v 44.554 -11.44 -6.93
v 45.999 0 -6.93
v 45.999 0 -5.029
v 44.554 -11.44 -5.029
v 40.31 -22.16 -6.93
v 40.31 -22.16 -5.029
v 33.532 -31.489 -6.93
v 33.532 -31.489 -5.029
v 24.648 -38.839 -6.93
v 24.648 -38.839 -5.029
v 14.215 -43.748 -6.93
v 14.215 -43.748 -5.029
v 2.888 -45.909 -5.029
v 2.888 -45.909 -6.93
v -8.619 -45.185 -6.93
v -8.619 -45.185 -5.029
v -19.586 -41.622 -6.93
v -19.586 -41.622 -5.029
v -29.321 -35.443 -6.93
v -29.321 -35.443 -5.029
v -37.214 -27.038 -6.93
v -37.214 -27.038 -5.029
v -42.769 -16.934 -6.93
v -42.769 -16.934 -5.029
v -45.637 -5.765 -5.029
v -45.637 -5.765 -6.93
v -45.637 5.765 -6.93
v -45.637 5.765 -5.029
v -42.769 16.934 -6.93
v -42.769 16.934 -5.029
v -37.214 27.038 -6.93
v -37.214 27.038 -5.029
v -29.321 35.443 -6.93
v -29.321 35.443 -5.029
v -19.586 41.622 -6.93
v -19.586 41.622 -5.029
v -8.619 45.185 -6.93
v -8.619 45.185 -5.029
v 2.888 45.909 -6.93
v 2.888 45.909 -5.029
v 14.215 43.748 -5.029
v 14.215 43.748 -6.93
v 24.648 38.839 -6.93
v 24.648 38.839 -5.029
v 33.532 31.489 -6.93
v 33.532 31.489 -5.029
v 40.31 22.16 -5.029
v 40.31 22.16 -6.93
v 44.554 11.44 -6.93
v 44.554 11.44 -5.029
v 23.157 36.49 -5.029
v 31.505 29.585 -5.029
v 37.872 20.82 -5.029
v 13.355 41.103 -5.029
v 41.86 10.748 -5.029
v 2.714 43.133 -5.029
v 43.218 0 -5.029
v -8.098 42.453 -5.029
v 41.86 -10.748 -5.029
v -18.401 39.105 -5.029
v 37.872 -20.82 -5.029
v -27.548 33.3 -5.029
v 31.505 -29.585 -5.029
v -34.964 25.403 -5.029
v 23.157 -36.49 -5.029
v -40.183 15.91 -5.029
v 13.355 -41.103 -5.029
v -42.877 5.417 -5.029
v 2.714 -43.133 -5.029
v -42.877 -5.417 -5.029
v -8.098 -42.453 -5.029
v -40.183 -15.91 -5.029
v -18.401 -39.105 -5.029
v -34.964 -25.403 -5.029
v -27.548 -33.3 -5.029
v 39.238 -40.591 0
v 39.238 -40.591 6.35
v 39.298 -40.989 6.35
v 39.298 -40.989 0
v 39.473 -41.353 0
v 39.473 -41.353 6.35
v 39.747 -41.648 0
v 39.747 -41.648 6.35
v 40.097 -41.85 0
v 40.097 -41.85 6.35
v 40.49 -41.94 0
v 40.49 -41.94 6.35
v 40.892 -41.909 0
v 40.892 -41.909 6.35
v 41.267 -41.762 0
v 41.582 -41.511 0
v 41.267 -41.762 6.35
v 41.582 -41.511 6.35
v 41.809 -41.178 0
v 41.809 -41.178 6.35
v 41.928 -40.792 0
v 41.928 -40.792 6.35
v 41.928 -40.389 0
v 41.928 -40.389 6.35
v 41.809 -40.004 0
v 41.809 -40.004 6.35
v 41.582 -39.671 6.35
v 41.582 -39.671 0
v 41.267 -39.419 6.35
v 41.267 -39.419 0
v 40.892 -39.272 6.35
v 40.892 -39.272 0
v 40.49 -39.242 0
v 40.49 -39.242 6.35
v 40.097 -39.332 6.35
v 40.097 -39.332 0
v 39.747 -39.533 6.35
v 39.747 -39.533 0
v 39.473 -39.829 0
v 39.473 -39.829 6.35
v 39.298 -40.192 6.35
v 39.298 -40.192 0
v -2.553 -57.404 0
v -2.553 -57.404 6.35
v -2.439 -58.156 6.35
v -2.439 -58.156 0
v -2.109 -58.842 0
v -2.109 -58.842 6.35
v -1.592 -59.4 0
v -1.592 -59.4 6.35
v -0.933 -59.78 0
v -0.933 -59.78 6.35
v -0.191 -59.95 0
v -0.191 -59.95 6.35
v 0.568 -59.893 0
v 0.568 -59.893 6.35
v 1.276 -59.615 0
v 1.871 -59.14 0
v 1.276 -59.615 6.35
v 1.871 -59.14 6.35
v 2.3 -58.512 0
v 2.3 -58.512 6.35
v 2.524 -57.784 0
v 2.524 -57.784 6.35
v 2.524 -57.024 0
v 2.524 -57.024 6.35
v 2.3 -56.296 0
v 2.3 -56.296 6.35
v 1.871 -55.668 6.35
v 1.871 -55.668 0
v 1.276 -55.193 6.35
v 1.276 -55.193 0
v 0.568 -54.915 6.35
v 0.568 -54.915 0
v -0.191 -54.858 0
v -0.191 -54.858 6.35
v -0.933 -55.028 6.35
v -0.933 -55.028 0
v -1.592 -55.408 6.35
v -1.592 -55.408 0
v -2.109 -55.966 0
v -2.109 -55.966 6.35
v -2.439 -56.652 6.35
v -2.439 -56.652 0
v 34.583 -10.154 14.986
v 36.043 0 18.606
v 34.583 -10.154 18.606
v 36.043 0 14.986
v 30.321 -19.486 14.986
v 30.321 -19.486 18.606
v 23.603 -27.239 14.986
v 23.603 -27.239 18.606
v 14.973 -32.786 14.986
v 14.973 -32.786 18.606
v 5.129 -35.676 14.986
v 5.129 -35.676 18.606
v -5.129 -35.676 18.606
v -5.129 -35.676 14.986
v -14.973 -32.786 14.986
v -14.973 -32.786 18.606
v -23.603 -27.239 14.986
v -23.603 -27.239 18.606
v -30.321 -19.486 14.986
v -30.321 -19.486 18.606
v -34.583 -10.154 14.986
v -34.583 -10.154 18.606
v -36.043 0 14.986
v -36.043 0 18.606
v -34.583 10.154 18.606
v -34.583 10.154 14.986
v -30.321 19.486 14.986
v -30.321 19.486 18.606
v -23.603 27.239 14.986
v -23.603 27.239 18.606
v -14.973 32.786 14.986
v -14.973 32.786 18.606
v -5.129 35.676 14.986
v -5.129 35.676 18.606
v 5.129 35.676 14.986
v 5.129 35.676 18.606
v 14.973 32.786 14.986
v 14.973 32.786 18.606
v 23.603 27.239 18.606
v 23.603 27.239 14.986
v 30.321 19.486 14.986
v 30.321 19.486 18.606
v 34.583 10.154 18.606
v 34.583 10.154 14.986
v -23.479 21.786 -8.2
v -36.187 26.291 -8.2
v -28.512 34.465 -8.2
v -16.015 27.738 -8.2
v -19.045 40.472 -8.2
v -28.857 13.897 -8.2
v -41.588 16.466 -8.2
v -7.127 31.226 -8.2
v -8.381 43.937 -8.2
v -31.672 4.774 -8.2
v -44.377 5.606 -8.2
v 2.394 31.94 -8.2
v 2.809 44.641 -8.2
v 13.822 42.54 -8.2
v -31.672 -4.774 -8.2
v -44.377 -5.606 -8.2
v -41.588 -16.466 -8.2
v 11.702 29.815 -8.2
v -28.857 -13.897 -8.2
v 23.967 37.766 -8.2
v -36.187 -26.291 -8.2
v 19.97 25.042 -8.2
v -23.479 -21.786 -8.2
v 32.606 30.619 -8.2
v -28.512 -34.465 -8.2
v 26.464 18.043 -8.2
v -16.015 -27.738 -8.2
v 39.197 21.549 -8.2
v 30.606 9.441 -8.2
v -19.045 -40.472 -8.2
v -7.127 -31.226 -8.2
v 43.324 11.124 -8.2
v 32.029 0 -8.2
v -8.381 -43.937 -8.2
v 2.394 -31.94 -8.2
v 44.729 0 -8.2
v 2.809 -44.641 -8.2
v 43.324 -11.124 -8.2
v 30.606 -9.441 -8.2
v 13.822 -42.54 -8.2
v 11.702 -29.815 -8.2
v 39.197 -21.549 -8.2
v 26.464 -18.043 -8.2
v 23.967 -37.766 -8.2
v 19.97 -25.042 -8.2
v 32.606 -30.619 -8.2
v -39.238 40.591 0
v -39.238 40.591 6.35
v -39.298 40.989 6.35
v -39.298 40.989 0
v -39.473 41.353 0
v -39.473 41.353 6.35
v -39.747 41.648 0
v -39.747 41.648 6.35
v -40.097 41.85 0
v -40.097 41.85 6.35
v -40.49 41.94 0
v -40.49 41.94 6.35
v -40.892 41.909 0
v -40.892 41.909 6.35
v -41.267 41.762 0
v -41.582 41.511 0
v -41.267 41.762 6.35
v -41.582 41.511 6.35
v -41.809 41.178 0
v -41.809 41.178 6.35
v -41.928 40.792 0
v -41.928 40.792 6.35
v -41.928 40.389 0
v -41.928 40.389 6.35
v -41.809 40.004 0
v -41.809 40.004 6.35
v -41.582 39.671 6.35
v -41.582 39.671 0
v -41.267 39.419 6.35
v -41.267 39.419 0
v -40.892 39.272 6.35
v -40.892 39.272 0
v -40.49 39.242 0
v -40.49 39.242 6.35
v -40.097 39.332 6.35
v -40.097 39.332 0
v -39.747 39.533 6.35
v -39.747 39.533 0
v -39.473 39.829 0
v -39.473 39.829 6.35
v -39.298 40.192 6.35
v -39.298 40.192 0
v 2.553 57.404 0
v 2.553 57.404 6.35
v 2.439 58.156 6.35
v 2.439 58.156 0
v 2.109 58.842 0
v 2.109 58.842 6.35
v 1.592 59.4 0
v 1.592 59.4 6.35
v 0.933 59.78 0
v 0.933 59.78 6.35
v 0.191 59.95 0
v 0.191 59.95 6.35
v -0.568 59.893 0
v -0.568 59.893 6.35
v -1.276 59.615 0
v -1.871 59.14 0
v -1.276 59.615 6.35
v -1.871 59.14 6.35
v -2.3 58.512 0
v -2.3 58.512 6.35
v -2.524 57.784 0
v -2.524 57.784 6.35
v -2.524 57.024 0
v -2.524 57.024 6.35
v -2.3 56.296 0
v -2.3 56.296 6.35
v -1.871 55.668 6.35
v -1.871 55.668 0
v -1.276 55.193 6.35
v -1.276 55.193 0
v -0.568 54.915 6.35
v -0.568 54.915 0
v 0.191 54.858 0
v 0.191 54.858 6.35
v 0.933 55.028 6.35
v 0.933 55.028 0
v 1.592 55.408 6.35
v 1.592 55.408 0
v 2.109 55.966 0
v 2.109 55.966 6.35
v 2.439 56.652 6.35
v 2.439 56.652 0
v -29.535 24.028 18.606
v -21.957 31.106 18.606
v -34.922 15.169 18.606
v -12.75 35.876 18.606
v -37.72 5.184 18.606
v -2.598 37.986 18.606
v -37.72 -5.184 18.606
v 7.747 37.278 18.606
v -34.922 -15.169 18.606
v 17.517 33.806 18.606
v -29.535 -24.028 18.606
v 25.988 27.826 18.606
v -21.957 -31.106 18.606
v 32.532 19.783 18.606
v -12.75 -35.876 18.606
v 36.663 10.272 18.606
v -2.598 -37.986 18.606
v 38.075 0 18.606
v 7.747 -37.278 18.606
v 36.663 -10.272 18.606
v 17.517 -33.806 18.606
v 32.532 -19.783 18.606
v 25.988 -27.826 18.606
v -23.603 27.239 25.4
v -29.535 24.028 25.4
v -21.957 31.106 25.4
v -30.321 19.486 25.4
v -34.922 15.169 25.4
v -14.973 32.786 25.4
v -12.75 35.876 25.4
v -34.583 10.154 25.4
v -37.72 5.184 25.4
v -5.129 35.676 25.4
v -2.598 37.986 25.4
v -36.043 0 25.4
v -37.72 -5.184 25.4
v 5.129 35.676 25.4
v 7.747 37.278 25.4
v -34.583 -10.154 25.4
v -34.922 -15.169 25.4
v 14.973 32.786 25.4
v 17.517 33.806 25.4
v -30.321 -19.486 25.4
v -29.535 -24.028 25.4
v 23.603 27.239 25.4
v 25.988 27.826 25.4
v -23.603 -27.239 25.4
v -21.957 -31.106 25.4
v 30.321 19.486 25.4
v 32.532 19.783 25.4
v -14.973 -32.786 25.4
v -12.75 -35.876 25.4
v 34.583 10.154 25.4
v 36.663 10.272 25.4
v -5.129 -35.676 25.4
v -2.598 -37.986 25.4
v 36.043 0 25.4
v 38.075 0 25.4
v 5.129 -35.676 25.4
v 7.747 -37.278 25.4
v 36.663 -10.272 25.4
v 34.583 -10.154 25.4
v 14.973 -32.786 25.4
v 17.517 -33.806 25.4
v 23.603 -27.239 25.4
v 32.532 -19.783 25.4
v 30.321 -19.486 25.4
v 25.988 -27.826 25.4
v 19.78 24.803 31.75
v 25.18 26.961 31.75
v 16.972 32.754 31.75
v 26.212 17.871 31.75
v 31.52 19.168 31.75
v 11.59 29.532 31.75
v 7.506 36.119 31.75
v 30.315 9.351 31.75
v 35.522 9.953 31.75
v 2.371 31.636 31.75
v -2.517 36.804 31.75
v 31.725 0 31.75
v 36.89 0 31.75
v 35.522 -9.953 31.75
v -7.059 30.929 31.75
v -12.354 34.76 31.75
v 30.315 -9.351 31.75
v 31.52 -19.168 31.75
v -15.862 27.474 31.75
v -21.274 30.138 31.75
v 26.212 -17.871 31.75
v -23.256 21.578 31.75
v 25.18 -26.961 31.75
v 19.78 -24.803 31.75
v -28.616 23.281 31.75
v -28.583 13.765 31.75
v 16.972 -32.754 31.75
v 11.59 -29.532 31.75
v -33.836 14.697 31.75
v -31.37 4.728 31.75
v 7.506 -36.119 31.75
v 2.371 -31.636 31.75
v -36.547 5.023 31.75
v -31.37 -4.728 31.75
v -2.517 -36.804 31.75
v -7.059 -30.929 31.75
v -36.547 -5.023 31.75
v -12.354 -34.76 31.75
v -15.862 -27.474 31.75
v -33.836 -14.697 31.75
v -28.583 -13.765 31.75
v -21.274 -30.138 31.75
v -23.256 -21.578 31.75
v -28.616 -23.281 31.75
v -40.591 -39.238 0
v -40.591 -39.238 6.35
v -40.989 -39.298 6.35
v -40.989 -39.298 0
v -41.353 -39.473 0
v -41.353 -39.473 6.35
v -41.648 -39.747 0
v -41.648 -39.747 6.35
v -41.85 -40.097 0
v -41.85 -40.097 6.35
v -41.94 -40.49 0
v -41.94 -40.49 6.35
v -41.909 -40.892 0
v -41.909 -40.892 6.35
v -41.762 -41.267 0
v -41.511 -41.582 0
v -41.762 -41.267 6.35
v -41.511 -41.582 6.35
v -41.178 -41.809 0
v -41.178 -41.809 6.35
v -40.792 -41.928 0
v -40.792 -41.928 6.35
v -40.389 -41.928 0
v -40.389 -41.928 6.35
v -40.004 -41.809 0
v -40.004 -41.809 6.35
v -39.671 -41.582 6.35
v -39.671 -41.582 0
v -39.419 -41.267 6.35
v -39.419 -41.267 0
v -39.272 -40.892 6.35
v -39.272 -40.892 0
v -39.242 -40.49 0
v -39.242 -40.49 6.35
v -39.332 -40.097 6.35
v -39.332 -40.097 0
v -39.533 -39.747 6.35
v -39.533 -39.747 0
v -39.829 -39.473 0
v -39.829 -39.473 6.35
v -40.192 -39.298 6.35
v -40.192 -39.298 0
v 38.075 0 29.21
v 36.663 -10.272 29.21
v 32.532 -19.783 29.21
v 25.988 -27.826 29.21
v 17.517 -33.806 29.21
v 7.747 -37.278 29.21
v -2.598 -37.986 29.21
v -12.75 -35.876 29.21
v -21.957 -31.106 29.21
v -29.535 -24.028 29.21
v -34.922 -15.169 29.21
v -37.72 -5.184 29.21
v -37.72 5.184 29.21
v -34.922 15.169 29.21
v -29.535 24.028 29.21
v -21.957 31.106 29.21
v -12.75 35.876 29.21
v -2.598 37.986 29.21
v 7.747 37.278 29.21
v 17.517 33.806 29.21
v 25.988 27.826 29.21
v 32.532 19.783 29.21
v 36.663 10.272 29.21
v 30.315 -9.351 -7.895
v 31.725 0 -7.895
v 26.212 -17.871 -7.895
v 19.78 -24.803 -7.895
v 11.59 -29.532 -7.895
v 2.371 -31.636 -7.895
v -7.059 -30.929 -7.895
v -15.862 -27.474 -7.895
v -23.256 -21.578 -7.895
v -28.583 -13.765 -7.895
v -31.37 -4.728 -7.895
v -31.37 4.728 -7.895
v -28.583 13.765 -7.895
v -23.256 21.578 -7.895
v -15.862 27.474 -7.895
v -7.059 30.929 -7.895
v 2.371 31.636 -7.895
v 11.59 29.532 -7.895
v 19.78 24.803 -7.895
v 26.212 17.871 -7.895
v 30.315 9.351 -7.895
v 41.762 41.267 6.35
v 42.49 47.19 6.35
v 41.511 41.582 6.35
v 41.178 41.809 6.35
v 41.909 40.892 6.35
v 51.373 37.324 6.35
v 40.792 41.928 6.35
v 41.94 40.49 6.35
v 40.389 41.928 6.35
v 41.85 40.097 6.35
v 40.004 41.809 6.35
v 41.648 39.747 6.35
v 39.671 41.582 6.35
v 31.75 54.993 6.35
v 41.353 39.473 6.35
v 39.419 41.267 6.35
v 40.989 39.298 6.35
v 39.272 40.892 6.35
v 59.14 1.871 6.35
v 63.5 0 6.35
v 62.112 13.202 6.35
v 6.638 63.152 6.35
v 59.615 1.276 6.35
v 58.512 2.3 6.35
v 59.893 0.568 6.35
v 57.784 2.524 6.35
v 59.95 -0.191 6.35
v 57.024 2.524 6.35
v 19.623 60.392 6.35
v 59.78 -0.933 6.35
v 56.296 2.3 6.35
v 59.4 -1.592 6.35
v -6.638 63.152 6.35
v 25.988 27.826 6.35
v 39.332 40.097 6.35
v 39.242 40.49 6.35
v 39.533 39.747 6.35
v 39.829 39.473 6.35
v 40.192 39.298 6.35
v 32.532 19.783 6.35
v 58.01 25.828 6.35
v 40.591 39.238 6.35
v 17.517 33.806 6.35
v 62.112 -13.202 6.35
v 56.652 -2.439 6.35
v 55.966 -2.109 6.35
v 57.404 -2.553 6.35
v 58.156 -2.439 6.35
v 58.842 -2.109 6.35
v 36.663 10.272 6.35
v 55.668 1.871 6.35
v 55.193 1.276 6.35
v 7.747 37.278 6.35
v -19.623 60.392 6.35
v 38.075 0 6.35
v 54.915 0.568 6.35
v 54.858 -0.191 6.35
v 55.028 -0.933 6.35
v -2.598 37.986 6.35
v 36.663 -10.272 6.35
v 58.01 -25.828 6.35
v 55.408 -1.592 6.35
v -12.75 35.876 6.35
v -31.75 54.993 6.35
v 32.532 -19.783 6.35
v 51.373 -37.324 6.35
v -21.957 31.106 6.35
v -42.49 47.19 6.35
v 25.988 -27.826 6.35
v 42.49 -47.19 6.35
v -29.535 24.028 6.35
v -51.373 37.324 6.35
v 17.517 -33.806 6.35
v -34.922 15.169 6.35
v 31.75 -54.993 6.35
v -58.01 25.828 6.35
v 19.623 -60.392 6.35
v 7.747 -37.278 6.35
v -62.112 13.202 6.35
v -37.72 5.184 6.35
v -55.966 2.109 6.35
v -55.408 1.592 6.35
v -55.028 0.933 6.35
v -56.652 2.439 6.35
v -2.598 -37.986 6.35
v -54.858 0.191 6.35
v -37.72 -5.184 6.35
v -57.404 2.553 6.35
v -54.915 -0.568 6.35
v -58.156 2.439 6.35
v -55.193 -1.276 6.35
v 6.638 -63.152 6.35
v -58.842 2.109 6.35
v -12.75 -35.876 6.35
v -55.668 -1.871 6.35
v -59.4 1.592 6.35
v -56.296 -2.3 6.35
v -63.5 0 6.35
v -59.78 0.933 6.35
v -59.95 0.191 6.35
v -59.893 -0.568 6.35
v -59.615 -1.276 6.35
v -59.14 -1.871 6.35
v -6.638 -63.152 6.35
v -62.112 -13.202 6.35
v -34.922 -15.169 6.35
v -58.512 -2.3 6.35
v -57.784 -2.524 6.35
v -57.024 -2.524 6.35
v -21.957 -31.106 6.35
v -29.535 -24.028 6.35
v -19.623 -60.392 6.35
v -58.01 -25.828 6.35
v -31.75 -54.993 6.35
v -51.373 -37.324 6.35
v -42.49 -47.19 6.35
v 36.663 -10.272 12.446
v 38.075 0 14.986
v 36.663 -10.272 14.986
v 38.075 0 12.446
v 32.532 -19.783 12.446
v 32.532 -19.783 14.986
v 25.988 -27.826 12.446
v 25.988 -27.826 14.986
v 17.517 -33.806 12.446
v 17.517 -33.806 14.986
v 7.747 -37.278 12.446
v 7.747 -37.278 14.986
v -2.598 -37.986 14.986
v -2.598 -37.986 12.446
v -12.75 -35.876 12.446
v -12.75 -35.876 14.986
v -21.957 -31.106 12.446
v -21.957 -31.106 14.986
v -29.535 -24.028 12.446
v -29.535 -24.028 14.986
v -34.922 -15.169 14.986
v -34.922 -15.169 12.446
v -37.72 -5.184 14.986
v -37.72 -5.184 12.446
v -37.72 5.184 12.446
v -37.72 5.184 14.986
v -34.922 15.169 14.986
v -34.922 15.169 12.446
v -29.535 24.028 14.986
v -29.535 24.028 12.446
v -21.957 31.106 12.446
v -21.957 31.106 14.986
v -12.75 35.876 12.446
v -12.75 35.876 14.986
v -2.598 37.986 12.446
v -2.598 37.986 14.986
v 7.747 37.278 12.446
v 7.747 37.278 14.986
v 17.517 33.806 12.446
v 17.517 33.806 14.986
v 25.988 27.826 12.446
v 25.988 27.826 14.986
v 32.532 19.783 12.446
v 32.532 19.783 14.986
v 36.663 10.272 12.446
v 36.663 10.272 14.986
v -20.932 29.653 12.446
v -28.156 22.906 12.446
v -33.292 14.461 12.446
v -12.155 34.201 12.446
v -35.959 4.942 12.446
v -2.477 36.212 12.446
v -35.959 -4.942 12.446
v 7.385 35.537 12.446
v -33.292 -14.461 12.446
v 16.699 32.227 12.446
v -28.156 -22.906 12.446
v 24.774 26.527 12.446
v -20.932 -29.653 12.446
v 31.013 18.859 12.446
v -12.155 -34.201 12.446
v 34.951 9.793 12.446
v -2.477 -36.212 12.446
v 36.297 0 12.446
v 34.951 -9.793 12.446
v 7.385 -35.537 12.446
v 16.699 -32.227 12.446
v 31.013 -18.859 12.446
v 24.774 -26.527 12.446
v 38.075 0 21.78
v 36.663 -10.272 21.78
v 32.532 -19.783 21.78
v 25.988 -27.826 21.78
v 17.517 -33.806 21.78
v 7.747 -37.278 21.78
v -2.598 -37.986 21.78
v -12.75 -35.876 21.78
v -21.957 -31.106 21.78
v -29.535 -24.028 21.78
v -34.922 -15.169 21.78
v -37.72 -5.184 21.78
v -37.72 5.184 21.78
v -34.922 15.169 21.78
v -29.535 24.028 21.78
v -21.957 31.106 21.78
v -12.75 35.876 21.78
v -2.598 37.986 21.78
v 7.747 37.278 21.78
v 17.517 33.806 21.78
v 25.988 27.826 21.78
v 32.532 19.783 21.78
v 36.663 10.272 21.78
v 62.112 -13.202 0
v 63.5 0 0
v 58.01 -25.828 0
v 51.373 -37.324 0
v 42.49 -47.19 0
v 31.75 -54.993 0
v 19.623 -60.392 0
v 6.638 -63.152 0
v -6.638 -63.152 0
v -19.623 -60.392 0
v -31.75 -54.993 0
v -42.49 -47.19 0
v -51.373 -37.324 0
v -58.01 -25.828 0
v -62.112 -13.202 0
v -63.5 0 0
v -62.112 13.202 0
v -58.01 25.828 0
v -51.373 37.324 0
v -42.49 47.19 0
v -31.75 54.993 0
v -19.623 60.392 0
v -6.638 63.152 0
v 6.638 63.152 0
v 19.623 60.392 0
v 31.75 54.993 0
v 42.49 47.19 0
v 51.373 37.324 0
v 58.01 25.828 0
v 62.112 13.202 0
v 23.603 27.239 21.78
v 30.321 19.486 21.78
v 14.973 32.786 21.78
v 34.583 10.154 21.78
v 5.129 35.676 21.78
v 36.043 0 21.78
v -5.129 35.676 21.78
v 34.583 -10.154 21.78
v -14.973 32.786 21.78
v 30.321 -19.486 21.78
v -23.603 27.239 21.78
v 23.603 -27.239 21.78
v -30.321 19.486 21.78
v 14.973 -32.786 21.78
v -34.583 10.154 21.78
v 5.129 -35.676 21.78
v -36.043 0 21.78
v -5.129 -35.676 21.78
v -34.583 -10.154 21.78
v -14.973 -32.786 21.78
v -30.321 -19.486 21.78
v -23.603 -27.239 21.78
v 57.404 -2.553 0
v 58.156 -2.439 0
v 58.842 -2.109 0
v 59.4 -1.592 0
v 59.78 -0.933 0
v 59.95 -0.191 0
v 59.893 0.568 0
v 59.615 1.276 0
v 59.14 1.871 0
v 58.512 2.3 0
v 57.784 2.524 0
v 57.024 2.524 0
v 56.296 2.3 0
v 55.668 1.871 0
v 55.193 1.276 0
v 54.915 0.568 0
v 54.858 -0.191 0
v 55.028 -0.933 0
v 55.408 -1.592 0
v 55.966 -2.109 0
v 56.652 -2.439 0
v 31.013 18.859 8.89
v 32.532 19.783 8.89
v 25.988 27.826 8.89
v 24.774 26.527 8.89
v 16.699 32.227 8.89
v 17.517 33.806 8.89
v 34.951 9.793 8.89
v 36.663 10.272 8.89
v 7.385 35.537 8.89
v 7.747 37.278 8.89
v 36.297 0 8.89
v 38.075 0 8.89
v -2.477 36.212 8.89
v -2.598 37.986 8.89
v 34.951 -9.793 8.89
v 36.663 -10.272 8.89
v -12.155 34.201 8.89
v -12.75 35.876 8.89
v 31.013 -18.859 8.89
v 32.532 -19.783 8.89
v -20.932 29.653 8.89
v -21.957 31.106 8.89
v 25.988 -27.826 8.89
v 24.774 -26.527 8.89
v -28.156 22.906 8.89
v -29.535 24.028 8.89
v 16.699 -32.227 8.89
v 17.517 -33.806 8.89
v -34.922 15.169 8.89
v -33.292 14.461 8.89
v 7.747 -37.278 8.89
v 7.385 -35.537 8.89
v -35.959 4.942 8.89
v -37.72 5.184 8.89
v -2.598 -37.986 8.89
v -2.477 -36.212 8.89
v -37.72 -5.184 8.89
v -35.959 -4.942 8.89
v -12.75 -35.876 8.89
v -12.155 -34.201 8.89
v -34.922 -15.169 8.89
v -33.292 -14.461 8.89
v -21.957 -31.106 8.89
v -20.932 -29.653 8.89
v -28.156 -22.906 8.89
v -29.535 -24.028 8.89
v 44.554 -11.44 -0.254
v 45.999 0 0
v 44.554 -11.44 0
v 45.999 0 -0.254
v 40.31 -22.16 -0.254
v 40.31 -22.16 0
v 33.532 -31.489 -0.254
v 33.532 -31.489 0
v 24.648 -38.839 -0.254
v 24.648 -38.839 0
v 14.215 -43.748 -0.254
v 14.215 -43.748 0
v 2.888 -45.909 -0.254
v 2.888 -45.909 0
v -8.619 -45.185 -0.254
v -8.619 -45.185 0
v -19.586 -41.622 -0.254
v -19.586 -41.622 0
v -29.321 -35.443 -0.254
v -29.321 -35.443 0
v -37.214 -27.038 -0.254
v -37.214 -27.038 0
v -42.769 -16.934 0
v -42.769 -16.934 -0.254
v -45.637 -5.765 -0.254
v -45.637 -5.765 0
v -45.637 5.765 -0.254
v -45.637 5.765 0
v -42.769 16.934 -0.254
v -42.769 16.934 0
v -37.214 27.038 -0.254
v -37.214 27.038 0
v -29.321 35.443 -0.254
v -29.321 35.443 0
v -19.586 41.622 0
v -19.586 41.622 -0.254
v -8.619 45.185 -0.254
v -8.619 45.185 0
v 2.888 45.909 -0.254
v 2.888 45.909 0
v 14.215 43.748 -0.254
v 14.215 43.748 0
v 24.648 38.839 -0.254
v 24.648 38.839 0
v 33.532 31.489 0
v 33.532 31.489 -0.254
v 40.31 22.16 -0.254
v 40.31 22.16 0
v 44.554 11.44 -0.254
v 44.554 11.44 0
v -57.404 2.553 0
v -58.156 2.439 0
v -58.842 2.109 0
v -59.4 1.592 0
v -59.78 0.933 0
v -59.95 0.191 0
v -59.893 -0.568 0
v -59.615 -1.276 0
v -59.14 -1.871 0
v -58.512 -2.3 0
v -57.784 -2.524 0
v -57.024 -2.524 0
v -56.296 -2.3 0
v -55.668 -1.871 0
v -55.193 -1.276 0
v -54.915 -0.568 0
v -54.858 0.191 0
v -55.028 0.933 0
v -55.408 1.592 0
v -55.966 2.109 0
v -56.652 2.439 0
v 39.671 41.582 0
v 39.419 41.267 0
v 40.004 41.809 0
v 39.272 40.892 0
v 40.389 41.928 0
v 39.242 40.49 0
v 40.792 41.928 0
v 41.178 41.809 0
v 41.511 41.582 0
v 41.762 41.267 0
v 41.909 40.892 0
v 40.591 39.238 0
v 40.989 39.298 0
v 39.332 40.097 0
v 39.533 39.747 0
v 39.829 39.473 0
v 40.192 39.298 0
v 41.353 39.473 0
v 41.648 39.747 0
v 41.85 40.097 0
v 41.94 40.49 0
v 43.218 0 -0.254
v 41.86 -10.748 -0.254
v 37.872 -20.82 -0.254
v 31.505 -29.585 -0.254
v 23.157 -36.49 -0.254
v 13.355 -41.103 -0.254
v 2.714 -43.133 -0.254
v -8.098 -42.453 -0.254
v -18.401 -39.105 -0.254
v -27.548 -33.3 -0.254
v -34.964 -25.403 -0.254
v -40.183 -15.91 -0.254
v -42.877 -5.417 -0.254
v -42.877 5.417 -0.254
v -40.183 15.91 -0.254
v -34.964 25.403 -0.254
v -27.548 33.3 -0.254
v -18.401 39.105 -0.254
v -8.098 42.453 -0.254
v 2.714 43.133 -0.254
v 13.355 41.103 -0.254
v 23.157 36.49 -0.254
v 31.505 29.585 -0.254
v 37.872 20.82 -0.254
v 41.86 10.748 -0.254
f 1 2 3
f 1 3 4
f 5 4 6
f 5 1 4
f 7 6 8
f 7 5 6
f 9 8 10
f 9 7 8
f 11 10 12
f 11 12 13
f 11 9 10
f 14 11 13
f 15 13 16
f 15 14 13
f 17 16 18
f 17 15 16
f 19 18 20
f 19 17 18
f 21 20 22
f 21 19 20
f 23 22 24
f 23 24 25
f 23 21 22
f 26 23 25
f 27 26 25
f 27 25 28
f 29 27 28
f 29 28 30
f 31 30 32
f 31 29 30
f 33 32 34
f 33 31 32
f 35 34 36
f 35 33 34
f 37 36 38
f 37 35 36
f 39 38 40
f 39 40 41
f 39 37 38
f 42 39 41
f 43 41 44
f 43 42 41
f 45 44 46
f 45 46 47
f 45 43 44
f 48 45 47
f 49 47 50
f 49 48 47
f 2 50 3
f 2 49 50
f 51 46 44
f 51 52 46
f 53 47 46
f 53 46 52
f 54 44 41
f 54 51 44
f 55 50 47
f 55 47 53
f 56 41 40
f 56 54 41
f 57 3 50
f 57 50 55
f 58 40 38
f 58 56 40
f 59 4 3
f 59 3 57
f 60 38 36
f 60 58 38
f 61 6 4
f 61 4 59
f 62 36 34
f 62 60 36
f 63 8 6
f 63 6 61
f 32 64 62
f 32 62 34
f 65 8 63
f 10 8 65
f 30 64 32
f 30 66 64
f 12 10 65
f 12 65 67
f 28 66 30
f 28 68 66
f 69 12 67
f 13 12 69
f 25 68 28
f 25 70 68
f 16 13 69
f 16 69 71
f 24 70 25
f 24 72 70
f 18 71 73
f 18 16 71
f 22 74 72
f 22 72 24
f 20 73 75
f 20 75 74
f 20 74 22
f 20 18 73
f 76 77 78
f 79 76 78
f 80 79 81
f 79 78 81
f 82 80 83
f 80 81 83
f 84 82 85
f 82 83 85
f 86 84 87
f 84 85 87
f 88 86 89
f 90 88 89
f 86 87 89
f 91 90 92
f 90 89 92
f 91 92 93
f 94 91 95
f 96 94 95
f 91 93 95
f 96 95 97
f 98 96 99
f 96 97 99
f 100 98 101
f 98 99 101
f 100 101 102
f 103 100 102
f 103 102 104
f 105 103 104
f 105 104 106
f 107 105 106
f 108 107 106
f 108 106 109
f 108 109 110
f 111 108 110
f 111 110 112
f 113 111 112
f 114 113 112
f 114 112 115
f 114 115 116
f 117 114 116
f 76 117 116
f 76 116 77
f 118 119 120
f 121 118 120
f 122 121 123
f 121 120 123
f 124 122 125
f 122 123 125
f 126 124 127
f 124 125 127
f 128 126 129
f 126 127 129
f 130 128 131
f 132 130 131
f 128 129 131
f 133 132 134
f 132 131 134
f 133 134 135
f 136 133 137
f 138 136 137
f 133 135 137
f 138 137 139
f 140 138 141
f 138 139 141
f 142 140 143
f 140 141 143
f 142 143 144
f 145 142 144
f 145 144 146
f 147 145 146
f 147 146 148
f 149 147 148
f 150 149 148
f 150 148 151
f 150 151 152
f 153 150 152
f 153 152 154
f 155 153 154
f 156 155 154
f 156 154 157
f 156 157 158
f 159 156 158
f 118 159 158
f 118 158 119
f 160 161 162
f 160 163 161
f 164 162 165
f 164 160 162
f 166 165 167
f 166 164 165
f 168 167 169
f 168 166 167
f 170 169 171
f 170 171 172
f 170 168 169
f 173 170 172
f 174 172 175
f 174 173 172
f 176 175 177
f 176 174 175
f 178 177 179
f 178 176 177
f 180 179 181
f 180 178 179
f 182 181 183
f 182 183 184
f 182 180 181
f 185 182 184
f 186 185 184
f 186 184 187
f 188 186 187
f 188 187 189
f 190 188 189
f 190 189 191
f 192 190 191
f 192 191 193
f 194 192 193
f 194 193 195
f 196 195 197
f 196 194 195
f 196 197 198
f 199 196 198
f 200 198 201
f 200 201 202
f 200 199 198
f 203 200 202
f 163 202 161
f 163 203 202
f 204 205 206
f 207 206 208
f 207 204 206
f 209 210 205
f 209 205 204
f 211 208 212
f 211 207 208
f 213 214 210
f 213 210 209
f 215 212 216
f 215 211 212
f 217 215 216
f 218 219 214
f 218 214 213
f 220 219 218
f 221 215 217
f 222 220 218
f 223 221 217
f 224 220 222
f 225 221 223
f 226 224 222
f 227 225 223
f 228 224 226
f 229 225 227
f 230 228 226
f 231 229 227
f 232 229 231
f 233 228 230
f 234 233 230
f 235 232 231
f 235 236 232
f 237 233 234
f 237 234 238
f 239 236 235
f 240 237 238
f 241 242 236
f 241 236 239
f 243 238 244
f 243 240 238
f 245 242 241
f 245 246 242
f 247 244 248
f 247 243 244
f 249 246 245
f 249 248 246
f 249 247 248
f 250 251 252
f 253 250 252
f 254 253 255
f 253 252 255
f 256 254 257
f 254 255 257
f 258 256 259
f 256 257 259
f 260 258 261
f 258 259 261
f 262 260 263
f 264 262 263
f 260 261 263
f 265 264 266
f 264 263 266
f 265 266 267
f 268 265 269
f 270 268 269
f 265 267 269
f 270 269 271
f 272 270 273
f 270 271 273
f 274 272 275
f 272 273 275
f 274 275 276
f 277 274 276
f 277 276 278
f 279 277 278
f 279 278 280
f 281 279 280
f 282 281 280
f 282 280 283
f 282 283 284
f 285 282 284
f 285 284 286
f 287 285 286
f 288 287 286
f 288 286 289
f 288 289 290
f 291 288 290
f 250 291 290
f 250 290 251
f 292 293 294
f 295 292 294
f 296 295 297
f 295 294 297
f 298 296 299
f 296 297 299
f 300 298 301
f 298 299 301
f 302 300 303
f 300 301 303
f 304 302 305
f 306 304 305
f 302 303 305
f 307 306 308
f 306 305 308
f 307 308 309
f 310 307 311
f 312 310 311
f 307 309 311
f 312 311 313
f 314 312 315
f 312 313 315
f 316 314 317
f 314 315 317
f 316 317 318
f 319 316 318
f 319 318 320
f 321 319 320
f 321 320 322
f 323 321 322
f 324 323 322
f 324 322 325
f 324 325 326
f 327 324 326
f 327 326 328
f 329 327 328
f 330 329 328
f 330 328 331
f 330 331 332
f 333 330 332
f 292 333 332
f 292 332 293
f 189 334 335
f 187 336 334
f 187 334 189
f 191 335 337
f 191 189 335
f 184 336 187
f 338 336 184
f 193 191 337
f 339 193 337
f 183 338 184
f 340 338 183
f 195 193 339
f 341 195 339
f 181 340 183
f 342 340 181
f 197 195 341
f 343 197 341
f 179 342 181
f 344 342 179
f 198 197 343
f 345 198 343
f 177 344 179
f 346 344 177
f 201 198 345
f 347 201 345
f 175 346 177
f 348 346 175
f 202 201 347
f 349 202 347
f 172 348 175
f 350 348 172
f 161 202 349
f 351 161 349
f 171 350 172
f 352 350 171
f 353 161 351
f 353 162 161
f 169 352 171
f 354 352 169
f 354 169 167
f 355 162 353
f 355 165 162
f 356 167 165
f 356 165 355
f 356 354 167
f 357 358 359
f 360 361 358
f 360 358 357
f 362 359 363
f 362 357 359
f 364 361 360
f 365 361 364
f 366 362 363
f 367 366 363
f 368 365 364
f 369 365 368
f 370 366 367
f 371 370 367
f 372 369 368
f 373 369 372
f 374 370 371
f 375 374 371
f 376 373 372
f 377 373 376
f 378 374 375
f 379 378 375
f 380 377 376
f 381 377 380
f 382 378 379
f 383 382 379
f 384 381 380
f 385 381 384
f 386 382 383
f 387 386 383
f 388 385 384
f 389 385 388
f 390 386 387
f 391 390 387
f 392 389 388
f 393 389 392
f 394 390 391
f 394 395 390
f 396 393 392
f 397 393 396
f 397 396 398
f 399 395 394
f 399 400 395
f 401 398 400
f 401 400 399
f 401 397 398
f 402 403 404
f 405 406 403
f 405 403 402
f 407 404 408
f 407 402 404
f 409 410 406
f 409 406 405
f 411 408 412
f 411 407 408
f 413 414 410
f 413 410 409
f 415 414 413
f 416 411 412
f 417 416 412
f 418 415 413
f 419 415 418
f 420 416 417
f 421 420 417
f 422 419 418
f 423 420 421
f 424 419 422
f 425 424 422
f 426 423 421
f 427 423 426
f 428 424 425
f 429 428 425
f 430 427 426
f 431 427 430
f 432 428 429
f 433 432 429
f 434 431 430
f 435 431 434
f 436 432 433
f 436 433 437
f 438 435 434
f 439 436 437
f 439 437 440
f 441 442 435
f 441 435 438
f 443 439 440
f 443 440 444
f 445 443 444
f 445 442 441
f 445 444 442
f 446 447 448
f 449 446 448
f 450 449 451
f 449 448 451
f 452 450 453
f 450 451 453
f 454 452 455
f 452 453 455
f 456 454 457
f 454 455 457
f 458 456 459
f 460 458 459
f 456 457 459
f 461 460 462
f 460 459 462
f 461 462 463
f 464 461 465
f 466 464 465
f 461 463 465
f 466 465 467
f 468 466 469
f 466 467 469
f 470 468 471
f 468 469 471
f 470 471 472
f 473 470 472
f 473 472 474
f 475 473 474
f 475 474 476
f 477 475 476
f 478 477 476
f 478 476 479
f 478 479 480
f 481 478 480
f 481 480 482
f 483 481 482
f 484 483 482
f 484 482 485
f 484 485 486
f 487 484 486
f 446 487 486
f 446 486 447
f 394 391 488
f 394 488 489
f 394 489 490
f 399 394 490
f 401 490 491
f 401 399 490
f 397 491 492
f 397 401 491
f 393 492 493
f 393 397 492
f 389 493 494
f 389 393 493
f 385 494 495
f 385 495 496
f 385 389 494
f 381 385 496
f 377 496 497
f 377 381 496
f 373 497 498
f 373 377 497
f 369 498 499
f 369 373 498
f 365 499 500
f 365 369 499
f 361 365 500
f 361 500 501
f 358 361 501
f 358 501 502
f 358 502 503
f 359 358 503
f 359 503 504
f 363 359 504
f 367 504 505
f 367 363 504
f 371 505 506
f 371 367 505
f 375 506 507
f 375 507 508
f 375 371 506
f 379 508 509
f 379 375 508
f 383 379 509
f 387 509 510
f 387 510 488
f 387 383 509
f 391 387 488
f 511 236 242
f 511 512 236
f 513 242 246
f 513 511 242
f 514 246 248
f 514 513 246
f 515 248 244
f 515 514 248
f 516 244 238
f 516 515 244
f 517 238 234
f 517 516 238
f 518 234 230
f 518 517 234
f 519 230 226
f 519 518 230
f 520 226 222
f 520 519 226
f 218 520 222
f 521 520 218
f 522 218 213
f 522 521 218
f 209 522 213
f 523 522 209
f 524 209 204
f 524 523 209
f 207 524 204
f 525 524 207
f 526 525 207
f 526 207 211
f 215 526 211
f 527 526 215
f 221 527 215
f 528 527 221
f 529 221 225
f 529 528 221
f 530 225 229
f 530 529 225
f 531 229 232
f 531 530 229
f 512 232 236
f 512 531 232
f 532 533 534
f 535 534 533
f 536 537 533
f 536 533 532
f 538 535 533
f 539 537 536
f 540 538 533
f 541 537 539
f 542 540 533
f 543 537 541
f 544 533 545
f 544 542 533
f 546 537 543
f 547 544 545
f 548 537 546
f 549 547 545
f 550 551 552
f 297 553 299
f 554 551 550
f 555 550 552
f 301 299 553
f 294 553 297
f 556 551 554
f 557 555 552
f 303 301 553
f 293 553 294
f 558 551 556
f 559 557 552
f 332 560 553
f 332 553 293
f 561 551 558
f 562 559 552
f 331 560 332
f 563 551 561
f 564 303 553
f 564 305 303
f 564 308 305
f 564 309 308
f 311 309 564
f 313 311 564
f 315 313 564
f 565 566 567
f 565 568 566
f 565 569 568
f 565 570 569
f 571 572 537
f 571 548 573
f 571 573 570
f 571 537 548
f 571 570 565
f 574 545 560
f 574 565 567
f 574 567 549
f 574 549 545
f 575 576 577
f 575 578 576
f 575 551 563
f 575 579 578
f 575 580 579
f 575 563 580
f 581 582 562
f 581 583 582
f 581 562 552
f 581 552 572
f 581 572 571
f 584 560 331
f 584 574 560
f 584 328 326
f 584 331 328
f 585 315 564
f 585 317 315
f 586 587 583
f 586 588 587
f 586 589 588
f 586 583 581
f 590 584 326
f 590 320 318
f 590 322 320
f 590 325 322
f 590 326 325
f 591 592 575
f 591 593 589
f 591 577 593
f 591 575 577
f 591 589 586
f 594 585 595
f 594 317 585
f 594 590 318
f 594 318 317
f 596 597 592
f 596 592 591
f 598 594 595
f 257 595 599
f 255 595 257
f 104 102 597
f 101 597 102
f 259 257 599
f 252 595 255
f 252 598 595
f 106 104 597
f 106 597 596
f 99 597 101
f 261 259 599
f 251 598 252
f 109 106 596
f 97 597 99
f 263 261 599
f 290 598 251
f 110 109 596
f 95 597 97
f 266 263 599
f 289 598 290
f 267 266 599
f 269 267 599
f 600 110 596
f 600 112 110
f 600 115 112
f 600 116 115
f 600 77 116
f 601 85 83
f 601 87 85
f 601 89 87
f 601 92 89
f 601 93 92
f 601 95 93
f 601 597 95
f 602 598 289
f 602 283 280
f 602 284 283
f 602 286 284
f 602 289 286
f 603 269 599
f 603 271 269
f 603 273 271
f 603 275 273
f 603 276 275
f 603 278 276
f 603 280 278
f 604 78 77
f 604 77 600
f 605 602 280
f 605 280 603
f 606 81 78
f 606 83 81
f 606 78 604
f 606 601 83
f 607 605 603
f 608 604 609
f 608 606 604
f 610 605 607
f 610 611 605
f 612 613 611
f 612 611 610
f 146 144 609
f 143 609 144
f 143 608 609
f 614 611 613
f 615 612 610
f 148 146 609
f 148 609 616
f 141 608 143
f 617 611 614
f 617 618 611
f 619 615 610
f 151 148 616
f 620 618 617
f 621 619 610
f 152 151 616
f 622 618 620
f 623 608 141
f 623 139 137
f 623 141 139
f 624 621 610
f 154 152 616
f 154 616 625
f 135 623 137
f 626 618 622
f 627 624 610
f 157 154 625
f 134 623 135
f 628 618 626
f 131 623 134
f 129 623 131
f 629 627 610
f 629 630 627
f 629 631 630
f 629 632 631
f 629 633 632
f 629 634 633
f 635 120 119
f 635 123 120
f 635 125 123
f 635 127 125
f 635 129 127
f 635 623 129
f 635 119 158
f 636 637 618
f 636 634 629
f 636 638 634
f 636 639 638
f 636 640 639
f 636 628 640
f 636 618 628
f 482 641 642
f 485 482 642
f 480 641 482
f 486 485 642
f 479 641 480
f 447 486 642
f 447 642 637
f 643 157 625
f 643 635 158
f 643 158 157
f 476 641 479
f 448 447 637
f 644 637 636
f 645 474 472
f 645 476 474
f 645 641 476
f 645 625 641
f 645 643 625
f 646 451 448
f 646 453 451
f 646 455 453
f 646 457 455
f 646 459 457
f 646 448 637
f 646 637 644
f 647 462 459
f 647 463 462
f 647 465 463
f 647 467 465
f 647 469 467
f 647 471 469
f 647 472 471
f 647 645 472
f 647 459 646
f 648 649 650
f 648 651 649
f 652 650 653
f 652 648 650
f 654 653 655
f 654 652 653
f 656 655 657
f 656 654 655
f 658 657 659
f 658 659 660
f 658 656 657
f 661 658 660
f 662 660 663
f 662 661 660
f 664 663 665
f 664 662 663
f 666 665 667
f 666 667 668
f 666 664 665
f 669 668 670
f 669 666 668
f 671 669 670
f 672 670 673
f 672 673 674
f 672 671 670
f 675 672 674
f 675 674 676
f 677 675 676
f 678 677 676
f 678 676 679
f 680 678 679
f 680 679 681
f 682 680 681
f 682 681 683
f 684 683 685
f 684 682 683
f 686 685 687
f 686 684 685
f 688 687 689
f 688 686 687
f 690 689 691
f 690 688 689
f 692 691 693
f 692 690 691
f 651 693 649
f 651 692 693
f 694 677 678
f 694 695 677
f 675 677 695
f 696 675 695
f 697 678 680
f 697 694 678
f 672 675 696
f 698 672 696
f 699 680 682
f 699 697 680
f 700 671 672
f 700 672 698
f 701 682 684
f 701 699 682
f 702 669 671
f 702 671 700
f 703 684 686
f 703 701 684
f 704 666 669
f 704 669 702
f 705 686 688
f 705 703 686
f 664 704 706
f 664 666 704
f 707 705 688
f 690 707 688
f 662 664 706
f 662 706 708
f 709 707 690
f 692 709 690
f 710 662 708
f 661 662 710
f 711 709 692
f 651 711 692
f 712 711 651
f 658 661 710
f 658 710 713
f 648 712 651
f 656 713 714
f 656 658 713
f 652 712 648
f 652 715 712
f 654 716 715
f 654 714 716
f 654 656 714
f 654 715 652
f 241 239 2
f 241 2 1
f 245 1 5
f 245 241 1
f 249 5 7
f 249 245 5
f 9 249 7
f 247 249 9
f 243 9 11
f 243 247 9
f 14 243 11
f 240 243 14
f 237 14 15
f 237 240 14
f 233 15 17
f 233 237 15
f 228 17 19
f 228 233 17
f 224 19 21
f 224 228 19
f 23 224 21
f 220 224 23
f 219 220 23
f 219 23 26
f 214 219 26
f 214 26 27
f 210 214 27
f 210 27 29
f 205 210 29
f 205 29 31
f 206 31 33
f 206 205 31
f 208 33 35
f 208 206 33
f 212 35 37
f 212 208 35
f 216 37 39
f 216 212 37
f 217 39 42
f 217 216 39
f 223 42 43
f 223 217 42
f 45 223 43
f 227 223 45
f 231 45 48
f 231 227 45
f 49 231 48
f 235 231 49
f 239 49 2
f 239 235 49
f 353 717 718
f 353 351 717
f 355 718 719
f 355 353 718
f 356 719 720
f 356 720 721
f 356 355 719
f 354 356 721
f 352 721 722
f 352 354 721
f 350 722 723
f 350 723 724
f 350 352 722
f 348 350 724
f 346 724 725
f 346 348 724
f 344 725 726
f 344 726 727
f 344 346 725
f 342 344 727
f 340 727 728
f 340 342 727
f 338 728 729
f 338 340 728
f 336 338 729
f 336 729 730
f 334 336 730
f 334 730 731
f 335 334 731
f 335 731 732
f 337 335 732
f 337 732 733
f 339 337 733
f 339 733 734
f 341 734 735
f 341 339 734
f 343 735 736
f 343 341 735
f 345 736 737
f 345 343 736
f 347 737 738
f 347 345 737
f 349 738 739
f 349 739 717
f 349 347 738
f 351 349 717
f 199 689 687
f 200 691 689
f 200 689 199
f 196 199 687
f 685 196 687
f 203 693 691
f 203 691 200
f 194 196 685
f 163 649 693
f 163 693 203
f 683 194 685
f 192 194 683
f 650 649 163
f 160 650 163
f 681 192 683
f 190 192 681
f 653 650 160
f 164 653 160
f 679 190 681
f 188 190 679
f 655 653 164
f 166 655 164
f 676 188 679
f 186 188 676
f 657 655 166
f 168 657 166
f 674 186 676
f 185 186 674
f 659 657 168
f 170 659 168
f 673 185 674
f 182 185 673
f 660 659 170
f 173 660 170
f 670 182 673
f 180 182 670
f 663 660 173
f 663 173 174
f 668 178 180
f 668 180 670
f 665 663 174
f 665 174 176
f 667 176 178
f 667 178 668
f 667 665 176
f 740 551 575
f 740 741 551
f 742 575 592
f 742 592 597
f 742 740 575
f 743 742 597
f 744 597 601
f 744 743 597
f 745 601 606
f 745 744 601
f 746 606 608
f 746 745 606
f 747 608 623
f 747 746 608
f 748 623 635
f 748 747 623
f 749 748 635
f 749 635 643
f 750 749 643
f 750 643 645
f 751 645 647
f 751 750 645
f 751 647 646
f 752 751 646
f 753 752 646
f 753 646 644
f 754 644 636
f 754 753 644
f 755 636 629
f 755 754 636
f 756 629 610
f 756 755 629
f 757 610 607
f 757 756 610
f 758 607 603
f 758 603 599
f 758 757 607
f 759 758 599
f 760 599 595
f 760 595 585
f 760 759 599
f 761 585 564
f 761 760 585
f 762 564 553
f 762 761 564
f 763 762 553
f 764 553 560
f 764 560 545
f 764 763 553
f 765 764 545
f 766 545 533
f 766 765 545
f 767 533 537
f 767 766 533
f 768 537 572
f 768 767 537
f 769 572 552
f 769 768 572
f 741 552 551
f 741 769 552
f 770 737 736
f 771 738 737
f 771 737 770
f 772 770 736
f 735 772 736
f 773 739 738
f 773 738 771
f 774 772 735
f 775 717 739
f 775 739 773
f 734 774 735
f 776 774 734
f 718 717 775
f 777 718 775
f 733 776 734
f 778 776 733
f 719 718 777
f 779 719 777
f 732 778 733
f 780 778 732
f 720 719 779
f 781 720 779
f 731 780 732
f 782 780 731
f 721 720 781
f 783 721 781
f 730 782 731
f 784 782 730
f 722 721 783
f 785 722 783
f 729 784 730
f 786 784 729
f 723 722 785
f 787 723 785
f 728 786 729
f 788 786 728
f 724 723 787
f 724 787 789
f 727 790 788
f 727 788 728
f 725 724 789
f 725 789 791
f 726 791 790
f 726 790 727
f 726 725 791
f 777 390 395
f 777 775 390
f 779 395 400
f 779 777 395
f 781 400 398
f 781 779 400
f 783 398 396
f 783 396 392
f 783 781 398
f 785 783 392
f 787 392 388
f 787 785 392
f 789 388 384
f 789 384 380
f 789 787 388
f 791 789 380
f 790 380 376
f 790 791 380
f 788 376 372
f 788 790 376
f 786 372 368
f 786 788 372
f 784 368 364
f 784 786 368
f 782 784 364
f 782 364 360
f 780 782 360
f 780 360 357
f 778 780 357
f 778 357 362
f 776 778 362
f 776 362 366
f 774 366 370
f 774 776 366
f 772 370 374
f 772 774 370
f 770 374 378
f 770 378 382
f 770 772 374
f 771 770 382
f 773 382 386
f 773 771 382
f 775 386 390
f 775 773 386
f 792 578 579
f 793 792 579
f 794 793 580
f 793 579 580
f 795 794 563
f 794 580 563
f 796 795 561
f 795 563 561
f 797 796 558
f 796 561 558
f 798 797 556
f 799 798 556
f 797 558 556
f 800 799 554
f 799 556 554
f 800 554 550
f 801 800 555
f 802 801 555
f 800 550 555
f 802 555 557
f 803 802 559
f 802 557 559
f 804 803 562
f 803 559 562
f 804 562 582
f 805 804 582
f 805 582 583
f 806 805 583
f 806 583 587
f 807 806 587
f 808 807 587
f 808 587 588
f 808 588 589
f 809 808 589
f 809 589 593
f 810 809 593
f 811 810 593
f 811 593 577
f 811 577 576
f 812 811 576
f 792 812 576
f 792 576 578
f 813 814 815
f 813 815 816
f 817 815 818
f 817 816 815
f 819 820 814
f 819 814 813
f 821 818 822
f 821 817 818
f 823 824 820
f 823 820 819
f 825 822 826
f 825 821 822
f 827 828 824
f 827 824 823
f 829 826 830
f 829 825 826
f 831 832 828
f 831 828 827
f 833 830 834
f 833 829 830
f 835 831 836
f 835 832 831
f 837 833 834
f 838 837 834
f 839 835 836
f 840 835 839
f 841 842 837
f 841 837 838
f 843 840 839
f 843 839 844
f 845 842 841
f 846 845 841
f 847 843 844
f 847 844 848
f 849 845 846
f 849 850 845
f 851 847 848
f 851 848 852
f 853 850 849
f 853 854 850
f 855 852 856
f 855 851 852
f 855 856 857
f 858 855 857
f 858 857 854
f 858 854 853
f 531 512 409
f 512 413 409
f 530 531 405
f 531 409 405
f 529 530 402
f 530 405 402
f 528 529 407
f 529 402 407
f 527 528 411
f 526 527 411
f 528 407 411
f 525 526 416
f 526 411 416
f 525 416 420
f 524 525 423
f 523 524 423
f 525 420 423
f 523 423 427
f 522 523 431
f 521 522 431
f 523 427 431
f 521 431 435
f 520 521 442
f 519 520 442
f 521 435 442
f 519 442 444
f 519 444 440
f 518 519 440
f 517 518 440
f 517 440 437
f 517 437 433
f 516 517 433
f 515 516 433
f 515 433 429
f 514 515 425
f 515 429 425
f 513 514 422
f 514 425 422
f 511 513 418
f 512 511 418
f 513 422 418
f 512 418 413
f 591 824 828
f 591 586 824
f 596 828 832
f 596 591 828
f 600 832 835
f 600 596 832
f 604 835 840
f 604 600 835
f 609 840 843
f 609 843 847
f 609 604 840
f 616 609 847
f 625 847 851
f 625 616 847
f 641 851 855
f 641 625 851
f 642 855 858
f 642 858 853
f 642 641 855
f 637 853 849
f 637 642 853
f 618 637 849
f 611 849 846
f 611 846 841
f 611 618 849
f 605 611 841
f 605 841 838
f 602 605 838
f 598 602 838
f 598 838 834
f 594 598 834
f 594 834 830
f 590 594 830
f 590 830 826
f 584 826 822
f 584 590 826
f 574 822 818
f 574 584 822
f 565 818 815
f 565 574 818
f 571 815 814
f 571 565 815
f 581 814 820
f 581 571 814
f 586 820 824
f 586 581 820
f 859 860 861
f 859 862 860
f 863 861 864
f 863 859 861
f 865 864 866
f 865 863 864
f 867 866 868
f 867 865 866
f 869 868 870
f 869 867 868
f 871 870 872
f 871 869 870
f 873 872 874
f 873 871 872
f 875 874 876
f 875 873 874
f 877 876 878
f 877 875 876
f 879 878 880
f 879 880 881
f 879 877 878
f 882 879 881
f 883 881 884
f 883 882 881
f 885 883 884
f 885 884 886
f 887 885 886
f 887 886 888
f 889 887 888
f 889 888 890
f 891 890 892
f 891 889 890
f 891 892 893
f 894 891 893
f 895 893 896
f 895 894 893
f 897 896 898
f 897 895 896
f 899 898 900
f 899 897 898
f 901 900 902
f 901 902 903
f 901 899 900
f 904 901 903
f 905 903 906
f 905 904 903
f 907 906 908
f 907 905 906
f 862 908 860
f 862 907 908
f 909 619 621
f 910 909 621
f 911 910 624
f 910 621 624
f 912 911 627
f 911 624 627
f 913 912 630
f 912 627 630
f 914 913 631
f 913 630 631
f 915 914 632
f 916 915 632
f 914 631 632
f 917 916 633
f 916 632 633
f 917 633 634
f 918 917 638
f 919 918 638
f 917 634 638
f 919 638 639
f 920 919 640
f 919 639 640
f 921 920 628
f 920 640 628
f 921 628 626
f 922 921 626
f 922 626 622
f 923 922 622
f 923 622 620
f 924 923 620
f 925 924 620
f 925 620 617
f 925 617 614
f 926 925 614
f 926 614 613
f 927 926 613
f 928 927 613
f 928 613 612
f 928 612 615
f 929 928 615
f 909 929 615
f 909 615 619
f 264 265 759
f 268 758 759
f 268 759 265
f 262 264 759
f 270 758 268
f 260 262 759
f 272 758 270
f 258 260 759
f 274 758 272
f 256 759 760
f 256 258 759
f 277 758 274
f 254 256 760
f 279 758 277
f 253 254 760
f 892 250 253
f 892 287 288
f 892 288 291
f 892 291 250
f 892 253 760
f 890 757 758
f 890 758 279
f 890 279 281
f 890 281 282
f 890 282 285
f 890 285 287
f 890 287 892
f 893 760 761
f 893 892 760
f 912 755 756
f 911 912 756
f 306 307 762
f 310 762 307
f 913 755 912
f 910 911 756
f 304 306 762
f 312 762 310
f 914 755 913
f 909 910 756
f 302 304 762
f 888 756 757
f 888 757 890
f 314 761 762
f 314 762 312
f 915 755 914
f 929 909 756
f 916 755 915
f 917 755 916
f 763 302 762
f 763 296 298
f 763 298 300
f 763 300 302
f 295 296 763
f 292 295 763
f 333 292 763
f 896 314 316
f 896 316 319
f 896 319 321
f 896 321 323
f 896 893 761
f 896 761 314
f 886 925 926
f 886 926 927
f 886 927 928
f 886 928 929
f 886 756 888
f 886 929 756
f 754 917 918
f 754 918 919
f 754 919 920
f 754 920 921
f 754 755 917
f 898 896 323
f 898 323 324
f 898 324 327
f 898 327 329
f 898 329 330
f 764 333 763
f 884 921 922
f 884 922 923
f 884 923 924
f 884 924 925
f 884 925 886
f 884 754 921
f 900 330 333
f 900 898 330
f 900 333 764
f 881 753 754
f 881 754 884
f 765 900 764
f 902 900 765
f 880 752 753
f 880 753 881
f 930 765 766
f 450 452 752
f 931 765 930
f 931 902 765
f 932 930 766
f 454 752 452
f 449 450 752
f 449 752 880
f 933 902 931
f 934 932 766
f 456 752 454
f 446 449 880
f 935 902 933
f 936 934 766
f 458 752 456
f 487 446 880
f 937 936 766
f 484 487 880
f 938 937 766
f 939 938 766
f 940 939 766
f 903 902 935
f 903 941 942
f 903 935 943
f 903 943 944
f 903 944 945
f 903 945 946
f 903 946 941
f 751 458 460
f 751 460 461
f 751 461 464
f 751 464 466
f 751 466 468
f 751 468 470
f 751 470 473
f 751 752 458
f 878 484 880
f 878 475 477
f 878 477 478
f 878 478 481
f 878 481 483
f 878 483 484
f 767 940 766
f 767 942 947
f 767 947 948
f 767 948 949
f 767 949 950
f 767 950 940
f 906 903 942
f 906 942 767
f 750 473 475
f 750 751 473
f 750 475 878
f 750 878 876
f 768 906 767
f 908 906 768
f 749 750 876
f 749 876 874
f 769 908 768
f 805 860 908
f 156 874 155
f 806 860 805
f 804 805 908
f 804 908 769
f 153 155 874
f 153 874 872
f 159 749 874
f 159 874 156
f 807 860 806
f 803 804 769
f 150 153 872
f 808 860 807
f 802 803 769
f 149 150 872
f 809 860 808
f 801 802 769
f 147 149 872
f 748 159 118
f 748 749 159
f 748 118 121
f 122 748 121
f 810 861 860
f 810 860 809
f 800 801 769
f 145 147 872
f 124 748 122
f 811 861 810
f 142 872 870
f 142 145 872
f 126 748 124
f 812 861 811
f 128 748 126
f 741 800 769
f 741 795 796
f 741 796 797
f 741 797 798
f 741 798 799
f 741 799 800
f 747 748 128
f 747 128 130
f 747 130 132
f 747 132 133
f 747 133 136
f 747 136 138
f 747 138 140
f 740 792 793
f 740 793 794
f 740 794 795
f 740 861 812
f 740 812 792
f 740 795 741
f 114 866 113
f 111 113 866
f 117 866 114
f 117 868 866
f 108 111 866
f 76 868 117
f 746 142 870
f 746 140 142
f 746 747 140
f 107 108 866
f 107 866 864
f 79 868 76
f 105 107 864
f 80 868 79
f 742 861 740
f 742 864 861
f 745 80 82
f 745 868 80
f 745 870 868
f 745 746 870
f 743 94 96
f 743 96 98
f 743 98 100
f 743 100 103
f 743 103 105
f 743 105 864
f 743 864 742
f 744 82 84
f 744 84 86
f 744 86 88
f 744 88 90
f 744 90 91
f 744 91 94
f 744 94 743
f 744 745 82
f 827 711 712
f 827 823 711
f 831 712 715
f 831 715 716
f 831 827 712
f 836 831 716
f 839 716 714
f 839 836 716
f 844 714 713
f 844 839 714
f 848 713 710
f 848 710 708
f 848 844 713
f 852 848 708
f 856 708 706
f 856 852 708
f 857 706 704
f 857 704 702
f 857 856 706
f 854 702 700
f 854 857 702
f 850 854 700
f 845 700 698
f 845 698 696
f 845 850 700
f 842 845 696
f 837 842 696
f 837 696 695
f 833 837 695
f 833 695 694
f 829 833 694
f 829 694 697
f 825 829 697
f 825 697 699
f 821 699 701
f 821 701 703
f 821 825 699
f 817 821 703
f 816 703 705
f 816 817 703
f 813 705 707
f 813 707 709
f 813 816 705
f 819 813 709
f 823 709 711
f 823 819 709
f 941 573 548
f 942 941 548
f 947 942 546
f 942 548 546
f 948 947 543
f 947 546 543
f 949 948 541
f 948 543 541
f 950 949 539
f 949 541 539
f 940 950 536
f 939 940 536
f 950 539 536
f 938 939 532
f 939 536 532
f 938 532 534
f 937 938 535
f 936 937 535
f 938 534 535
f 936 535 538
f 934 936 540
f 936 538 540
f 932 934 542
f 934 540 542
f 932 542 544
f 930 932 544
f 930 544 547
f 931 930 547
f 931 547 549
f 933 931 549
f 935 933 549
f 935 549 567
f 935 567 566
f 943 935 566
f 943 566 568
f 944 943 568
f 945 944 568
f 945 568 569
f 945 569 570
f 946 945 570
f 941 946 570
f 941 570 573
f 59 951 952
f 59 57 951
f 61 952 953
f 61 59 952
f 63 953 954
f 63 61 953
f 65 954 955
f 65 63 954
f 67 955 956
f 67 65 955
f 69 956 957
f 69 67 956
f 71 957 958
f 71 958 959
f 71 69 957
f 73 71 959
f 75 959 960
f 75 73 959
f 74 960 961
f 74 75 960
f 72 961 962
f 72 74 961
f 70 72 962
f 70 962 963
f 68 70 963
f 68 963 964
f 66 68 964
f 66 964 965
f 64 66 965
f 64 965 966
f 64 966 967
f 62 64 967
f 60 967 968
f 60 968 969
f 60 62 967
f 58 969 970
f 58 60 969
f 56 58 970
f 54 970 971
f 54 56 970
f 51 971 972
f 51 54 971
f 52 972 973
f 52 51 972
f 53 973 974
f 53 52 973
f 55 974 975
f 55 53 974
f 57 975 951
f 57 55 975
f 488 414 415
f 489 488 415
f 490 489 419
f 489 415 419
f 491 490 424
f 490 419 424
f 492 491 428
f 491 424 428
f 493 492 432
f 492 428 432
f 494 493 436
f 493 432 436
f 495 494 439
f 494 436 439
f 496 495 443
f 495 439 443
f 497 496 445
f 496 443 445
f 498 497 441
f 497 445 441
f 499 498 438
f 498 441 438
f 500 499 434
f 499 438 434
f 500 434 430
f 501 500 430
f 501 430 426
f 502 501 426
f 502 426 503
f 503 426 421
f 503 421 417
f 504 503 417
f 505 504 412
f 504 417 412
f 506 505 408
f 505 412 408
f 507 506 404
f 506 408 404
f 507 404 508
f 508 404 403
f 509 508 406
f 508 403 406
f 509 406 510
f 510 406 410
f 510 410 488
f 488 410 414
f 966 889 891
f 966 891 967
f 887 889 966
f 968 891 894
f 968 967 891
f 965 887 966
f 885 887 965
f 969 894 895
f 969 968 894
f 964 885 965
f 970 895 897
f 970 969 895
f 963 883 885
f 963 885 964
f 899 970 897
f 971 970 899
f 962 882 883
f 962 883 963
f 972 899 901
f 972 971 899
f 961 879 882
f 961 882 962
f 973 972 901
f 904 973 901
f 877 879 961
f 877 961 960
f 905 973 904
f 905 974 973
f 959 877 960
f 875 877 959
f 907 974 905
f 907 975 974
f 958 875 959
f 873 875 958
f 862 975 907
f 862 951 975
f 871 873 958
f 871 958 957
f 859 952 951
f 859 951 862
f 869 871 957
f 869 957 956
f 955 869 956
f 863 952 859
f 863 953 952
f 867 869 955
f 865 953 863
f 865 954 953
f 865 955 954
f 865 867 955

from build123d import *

# Parameters (mm, degrees)
CHAMFER2_SIZE          = 1.27
SKETCH7_R              = 31.7246
CUT_EXTRUDE1_DEPTH     = 15.55
F_6_32_TAPPED_HOLE1_D  = 2.7051
CIRPATTERN2_COUNT      = 4
F_10_CLEARANCE_HOLE1_D = 5.1054
CIRPATTERN3_COUNT      = 4
CHAMFER1_SIZE          = 2.54
CHAMFER1_SIZE2         = 1.184421452


with BuildPart() as part:
    # Sketch1 → Revolve1 (revolve)
    with BuildSketch(Plane(origin=(0, 0, 0), x_dir=(1, 0, 0), z_dir=(0, 1, 0))):
        Polygon((63.5, 0), (45.9994, 0), (45.9994, 0.254), (43.2181, 0.254), (43.2181, 5.0292), (45.9994, 5.0292), (45.9994, 8.2), (30.7594, 8.2), (30.7594, 0), (0, 0), (0, -6.35), (31.7246, -6.35), (31.7246, -31.75), (38.0746, -31.75), (38.0746, -25.4), (36.0426, -25.4), (36.0426, -21.7805), (38.0746, -21.7805), (38.0746, -18.6055), (36.0426, -18.6055), (36.0426, -14.986), (38.0746, -14.986), (38.0746, -12.446), (36.2966, -12.446), (36.2966, -8.89), (38.0746, -8.89), (38.0746, -6.35), (63.5, -6.35), align=None)
    revolve(axis=Axis((0, 0, 6.35), (0, 0, -1)))

    # Chamfer2
    chamfer2_edges = [part.edges().sort_by_distance(p)[0] for p in [
        (-45.9994, 0, -8.2),
        (-30.7594, 0, -8.2),
    ]]
    chamfer(chamfer2_edges, length=CHAMFER2_SIZE)

    # Sketch7 → Cut-Extrude1 (cut, through all)
    with BuildSketch(Plane.XY.offset(6.35)):
        Circle(SKETCH7_R)
    extrude(amount=-CUT_EXTRUDE1_DEPTH, mode=Mode.SUBTRACT)

    # #6-32 Tapped Hole1 (through all)
    with Locations(Plane(origin=(0, 0, 0), x_dir=(-1, 0, 0), z_dir=(0, 0, -1))):
        with Locations((40.590757667, 40.590757667)):
            f_6_32_tapped_hole1 = Hole(F_6_32_TAPPED_HOLE1_D / 2)

    # CirPattern2: #6-32 Tapped Hole1 ×4 about axis
    cirpattern2_axis = Axis((0, 0, 0), (0, 0, 1))
    for i in range(1, CIRPATTERN2_COUNT):
        add(f_6_32_tapped_hole1.rotate(cirpattern2_axis, i * 360 / CIRPATTERN2_COUNT), mode=Mode.SUBTRACT)

    # #10 Clearance Hole1 (through all)
    with Locations(Plane(origin=(0, 0, 0), x_dir=(-1, 0, 0), z_dir=(0, 0, -1))):
        with Locations((0, 57.404)):
            f_10_clearance_hole1 = Hole(F_10_CLEARANCE_HOLE1_D / 2)

    # CirPattern3: #10 Clearance Hole1 ×4 about axis
    cirpattern3_axis = Axis((0, 0, 0), (0, 0, 1))
    for i in range(1, CIRPATTERN3_COUNT):
        add(f_10_clearance_hole1.rotate(cirpattern3_axis, i * 360 / CIRPATTERN3_COUNT), mode=Mode.SUBTRACT)

    # Chamfer1
    chamfer1_edges = [part.edges().sort_by_distance(p)[0] for p in [
        (-38.0746, 0, 31.75),
    ]]
    chamfer1_side = [part.faces().sort_by_distance(p)[0] for p in [
        (-38.0746, 0, 28.575),
    ]]
    chamfer(chamfer1_edges, length=CHAMFER1_SIZE, length2=CHAMFER1_SIZE2, reference=chamfer1_side[0])


solid = part.part
